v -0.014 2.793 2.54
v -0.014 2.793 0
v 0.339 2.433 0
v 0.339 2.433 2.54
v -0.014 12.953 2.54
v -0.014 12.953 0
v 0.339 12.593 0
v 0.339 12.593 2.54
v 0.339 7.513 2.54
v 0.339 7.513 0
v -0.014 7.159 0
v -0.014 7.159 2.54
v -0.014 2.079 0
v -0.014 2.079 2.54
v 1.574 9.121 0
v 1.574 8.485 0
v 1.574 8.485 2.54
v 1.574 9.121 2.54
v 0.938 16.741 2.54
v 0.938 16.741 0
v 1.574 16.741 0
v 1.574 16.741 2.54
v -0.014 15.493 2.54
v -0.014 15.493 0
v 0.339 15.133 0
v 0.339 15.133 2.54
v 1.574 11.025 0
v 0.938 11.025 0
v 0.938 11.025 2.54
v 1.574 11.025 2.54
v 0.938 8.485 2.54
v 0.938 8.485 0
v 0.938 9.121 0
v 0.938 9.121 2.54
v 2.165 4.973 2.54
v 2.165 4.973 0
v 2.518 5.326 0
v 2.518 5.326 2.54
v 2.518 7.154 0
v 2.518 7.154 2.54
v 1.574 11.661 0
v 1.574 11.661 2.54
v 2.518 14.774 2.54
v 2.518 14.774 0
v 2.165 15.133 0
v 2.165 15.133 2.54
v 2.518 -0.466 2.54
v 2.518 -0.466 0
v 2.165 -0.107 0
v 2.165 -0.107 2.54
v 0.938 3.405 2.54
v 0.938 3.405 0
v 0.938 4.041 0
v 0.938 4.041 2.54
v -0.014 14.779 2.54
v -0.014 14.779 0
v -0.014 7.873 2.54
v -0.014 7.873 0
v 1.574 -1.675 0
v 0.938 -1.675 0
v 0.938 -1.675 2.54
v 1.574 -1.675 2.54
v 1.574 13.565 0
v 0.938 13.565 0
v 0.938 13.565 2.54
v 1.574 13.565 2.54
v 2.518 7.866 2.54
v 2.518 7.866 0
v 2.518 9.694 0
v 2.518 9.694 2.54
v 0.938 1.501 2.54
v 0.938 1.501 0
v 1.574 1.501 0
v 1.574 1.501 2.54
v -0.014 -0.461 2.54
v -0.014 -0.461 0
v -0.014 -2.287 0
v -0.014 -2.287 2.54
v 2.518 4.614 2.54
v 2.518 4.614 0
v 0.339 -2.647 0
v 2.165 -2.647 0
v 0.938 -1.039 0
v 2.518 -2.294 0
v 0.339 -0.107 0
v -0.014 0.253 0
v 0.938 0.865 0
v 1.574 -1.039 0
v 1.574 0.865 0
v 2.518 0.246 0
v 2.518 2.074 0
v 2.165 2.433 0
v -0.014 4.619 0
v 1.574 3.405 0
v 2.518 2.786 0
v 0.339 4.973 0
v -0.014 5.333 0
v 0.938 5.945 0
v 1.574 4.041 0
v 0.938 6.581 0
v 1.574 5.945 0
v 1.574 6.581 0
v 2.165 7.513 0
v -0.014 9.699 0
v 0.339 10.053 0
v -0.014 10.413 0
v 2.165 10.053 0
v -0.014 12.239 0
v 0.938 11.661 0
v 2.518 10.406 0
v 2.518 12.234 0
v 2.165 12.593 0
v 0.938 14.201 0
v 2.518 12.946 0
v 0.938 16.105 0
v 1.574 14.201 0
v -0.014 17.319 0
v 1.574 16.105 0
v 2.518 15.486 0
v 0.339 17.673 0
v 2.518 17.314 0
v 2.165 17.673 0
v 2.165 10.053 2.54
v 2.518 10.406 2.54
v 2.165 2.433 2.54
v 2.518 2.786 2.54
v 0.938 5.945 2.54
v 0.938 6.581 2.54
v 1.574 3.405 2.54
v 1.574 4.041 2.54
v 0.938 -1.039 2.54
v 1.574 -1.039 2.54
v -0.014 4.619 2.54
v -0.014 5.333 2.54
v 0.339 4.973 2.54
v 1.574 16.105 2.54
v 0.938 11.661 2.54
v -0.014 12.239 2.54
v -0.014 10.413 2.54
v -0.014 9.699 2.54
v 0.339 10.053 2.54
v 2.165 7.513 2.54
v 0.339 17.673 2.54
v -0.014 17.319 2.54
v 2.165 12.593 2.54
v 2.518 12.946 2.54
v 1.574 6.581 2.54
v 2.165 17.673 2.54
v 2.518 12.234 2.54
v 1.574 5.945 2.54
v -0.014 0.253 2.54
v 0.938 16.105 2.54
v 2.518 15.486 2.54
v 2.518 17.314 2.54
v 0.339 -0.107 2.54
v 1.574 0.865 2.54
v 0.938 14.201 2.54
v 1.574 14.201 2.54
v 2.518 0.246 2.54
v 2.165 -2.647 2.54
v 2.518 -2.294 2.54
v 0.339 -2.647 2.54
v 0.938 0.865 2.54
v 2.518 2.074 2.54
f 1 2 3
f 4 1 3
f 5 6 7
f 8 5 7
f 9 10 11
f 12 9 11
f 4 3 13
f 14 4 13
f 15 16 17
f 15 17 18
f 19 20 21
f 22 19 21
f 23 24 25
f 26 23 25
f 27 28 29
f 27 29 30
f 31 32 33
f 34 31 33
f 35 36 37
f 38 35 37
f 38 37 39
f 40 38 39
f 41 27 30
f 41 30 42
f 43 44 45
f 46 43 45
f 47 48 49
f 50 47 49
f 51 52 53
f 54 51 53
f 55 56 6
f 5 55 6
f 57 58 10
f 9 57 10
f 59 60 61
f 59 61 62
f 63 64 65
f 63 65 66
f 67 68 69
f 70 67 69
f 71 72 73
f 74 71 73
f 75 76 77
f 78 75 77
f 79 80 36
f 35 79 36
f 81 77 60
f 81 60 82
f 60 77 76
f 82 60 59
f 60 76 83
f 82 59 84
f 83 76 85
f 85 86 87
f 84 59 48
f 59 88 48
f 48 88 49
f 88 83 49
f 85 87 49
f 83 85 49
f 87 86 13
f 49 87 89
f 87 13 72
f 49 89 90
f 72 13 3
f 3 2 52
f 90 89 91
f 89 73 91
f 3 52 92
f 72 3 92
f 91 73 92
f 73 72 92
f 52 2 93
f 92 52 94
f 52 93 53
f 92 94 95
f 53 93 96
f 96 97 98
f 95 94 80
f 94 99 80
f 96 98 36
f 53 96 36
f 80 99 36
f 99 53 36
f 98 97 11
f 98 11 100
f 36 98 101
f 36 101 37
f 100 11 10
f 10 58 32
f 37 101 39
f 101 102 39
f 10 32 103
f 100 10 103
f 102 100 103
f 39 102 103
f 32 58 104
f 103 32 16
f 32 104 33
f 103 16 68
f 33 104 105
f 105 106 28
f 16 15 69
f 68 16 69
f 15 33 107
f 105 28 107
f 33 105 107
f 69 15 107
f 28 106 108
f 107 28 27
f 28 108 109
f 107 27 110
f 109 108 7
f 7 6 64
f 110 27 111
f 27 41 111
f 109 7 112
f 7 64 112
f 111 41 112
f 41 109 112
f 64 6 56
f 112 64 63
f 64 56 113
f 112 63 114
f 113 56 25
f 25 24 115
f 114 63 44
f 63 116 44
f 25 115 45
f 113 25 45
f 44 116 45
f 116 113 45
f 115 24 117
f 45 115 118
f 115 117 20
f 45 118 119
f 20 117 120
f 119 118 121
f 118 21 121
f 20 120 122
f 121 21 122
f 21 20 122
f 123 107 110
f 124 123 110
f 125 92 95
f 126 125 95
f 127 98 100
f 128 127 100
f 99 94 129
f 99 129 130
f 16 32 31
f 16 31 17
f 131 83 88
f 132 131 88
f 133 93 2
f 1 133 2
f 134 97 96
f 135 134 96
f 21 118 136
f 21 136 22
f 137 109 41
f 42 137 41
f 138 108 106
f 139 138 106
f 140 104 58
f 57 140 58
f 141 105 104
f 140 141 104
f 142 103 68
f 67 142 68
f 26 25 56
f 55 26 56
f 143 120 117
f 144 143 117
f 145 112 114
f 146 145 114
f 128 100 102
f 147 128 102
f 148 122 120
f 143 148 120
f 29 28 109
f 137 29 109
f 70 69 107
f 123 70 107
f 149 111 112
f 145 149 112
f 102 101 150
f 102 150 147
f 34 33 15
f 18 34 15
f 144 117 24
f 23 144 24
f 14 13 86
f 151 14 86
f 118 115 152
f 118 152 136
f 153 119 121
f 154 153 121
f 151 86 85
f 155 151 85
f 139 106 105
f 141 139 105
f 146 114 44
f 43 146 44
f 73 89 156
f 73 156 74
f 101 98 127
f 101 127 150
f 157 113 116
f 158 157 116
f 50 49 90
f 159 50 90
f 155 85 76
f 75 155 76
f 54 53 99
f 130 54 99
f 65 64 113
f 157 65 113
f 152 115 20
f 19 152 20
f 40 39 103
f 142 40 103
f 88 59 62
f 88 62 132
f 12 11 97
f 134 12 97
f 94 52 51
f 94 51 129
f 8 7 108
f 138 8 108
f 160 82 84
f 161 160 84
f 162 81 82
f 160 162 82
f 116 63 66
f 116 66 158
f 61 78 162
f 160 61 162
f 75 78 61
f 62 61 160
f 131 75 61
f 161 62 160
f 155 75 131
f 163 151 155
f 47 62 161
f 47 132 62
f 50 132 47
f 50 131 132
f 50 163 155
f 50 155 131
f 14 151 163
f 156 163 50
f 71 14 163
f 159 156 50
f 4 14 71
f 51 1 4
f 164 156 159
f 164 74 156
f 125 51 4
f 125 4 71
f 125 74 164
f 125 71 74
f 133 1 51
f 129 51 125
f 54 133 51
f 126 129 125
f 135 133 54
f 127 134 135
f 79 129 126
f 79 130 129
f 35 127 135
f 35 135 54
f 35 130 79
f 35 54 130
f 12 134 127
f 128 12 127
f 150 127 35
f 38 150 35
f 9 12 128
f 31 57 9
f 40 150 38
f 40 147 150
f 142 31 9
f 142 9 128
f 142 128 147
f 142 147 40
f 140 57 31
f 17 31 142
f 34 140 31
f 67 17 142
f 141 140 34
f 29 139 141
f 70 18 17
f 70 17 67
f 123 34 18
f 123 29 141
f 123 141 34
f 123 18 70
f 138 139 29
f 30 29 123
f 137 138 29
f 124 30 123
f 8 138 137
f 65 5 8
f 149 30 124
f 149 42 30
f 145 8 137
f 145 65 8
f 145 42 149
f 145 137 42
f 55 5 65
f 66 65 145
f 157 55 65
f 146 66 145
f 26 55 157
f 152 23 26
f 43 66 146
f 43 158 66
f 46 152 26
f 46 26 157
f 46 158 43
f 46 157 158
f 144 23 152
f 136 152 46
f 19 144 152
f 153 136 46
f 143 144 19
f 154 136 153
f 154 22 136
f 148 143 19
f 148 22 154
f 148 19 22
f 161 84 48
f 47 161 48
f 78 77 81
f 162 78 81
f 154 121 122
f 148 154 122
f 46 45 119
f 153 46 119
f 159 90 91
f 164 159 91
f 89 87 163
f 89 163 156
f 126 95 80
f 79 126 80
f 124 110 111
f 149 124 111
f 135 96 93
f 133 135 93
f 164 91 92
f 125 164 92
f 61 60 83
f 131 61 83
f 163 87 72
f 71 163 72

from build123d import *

# Parameters (mm, degrees)
PIN_DRAWING_W       = 0.636
PIN_DRAWING_H       = 0.636
BOSS_EXTRUDE1_DEPTH = 2.54


with BuildPart() as part:
    # pin_drawing → Boss-Extrude1 (new body)
    with BuildSketch(Plane.XY):
        Polygon((-0.014377737, 2.079116284), (-0.014377737, 0.25314904), (0.339175653, -0.107330326), (-0.014377737, -0.460883716), (-0.014377737, -2.28685096), (0.339175653, -2.647330326), (2.164719162, -2.647330326), (2.518272553, -2.293776935), (2.518272553, -0.46648), (2.164719162, -0.107330326), (2.518272553, 0.246223065), (2.518272553, 2.07352), (2.164719162, 2.432669674), (2.518272553, 2.786223065), (2.518272553, 4.61352), (2.164719162, 4.972669674), (2.518272553, 5.326223065), (2.518272553, 7.15352), (2.164719162, 7.512669674), (2.518272553, 7.866223065), (2.518272553, 9.69352), (2.164719162, 10.052669674), (2.518272553, 10.406223065), (2.518272553, 12.23352), (2.164719162, 12.592669674), (2.518272553, 12.946223065), (2.518272553, 14.77352), (2.164719162, 15.132669674), (2.518272553, 15.486223065), (2.518272553, 17.31352), (2.164719162, 17.672669674), (0.339175653, 17.672669674), (-0.014377737, 17.319116284), (-0.014377737, 15.49314904), (0.339175653, 15.132669674), (-0.014377737, 14.779116284), (-0.014377737, 12.95314904), (0.339175653, 12.592669674), (-0.014377737, 12.239116284), (-0.014377737, 10.41314904), (0.339175653, 10.052669674), (-0.014377737, 9.699116284), (-0.014377737, 7.87314904), (0.339175653, 7.512669674), (-0.014377737, 7.159116284), (-0.014377737, 5.33314904), (0.339175653, 4.972669674), (-0.014377737, 4.619116284), (-0.014377737, 2.79314904), (0.339175653, 2.432669674), align=None)
        with Locations((1.256122263, -1.357330326)):
            Rectangle(PIN_DRAWING_W, PIN_DRAWING_H, mode=Mode.SUBTRACT)
        with Locations((1.256122263, 1.182669674)):
            Rectangle(PIN_DRAWING_W, PIN_DRAWING_H, mode=Mode.SUBTRACT)
        with Locations((1.256122263, 3.722669674)):
            Rectangle(PIN_DRAWING_W, PIN_DRAWING_H, mode=Mode.SUBTRACT)
        with Locations((1.256122263, 6.262669674)):
            Rectangle(PIN_DRAWING_W, PIN_DRAWING_H, mode=Mode.SUBTRACT)
        with Locations((1.256122263, 8.802669674)):
            Rectangle(PIN_DRAWING_W, PIN_DRAWING_H, mode=Mode.SUBTRACT)
        with Locations((1.256122263, 11.342669674)):
            Rectangle(PIN_DRAWING_W, PIN_DRAWING_H, mode=Mode.SUBTRACT)
        with Locations((1.256122263, 13.882669674)):
            Rectangle(PIN_DRAWING_W, PIN_DRAWING_H, mode=Mode.SUBTRACT)
        with Locations((1.256122263, 16.422669674)):
            Rectangle(PIN_DRAWING_W, PIN_DRAWING_H, mode=Mode.SUBTRACT)
    extrude(amount=BOSS_EXTRUDE1_DEPTH)


solid = part.part
